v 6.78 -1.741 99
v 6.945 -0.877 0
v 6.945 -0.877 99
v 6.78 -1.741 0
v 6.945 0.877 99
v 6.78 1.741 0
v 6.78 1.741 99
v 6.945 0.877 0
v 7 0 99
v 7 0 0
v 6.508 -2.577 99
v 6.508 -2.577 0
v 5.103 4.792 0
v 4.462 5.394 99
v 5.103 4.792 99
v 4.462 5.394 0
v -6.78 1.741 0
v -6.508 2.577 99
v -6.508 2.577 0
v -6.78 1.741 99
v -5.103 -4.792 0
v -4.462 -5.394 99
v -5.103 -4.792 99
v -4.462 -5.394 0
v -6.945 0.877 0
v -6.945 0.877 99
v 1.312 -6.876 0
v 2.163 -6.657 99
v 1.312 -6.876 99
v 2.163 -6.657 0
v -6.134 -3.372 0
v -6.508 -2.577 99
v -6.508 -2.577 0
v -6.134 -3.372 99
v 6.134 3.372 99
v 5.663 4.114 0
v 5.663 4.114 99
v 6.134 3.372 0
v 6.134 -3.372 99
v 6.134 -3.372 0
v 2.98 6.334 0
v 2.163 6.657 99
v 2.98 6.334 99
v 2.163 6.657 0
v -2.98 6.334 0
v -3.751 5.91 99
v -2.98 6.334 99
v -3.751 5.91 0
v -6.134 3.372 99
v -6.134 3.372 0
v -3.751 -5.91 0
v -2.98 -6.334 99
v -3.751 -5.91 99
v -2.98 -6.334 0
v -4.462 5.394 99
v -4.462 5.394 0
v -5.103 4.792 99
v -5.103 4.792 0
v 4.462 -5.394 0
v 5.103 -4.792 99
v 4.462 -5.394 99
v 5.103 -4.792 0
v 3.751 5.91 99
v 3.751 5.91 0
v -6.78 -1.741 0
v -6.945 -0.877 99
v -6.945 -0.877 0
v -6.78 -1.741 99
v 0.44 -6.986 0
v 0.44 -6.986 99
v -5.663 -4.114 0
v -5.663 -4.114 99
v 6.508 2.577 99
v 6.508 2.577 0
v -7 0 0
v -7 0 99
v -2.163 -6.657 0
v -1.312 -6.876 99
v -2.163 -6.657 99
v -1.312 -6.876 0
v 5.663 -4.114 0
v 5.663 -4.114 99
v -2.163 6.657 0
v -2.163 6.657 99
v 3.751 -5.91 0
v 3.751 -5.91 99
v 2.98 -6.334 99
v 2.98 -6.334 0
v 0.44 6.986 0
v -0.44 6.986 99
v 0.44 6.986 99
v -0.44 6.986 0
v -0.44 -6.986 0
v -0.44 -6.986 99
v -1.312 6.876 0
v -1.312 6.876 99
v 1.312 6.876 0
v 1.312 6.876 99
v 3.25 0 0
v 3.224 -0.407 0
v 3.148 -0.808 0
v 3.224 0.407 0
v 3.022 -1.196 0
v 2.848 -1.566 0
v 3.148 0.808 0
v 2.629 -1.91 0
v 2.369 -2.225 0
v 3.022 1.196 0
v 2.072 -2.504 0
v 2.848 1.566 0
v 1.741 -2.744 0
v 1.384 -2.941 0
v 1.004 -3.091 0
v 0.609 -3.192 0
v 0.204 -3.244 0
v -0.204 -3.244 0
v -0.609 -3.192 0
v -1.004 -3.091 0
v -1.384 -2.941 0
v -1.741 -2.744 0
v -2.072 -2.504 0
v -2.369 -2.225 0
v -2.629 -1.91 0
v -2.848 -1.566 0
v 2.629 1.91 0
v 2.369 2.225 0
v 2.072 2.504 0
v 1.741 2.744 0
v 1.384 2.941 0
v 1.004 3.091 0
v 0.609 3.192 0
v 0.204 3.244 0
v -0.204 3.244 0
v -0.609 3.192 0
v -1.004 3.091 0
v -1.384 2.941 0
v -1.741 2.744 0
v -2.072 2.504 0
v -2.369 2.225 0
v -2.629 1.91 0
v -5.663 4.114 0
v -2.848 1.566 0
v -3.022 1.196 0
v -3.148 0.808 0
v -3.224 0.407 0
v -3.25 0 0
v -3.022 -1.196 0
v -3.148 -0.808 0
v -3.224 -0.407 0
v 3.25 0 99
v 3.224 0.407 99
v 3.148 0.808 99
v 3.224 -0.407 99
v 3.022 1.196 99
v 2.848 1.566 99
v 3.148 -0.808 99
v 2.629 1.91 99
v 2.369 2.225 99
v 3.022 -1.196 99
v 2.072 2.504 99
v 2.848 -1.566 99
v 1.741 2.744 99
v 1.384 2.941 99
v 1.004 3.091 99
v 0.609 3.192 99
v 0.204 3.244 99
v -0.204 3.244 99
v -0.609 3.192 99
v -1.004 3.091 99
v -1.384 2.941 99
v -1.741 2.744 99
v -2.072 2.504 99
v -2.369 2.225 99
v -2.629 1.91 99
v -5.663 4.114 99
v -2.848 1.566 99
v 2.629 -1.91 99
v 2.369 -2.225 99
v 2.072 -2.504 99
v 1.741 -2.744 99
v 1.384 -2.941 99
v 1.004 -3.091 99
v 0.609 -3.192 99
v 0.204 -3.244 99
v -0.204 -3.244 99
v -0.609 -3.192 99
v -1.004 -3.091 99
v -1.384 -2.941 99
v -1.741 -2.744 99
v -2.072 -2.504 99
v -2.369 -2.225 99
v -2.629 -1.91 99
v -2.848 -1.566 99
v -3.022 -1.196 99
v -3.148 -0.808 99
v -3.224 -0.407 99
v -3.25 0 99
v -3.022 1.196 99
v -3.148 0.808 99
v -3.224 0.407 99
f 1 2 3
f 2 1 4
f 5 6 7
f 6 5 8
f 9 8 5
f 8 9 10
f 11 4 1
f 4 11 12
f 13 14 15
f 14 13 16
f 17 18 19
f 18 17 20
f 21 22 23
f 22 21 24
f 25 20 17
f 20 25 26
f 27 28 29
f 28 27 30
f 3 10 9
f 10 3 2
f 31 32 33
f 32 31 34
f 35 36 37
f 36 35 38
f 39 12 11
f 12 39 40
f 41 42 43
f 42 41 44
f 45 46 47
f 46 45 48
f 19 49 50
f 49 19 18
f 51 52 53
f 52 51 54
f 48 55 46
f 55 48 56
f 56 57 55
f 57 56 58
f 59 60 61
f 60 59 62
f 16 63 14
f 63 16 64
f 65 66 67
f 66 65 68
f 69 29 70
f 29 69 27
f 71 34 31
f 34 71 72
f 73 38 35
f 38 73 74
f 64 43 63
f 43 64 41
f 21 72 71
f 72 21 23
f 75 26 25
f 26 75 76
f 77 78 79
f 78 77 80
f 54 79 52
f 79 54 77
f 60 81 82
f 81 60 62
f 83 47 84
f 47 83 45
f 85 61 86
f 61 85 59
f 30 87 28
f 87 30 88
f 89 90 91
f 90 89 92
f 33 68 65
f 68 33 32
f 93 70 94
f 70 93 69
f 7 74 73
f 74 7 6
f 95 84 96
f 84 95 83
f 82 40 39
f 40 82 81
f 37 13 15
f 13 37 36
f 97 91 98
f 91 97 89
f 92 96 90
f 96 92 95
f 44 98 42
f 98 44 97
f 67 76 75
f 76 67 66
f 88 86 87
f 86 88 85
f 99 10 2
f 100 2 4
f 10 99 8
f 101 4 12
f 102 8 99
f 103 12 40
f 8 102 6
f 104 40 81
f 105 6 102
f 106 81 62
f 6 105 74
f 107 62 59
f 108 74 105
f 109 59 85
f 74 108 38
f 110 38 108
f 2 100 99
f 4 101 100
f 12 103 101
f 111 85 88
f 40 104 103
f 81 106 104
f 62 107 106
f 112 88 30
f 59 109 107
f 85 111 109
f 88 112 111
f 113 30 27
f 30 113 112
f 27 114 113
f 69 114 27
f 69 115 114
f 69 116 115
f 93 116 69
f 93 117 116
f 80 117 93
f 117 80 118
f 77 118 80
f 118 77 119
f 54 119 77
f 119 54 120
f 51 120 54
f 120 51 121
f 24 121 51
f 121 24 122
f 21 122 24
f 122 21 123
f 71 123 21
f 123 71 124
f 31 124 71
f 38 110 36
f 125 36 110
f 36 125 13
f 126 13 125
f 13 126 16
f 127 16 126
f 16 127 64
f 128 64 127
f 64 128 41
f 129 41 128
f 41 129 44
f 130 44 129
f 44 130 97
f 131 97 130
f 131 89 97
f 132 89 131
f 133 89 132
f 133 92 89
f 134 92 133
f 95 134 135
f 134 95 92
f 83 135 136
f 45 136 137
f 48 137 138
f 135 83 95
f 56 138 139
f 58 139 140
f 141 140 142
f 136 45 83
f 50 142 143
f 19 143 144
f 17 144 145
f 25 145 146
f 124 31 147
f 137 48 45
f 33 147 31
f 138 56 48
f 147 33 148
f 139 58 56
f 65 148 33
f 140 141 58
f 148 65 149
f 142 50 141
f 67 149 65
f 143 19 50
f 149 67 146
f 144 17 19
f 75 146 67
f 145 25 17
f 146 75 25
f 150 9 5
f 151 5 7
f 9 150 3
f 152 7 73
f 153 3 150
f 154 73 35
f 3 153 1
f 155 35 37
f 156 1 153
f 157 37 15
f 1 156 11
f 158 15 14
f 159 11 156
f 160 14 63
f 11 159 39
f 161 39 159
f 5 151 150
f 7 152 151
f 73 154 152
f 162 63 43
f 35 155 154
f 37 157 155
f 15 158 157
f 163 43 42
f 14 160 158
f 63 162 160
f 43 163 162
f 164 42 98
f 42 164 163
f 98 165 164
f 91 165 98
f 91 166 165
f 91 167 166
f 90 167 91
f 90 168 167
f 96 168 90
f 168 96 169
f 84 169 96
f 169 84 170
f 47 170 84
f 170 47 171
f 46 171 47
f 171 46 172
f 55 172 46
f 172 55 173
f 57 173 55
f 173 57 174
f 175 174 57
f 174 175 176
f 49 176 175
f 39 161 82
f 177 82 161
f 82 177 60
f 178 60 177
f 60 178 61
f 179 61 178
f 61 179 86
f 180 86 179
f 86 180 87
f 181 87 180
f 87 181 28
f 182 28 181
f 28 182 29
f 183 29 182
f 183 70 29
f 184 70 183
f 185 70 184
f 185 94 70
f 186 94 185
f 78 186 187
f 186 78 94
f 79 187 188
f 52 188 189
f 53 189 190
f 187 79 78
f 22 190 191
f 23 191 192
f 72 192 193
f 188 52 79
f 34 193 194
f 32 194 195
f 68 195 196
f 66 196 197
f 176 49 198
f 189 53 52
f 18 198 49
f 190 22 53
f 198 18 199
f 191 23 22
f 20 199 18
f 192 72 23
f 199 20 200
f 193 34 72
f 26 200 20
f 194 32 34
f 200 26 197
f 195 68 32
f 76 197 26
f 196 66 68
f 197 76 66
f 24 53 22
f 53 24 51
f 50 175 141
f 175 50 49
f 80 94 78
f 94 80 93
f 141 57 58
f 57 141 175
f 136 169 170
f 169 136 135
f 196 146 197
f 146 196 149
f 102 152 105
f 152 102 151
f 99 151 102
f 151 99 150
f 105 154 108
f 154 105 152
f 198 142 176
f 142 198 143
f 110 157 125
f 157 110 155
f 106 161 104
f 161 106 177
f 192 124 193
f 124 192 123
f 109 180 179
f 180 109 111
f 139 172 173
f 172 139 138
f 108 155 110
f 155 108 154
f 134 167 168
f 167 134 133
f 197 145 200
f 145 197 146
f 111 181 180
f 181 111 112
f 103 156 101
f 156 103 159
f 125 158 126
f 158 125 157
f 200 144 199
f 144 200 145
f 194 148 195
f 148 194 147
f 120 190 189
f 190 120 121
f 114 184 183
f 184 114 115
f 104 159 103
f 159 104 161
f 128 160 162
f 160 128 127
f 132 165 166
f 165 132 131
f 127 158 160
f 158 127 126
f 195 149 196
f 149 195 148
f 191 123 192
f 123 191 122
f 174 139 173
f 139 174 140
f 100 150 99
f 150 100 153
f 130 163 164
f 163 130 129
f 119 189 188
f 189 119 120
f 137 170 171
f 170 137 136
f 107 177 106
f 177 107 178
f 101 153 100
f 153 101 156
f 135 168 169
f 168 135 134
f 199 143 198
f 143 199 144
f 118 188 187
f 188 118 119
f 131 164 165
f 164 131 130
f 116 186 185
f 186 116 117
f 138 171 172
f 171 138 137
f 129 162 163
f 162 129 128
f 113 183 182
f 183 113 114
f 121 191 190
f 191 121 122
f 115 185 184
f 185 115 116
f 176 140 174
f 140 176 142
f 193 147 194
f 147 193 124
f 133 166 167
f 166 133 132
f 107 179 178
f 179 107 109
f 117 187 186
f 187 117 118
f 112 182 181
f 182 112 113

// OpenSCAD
$fn = 50;


difference() {
	union() {
		cylinder(h = 99, r = 7.0000000000);
	}
	union() {
		translate(v = [0, 0, -100]) {
			cylinder(h = 200, r = 3.2500000000);
		}
	}
}
